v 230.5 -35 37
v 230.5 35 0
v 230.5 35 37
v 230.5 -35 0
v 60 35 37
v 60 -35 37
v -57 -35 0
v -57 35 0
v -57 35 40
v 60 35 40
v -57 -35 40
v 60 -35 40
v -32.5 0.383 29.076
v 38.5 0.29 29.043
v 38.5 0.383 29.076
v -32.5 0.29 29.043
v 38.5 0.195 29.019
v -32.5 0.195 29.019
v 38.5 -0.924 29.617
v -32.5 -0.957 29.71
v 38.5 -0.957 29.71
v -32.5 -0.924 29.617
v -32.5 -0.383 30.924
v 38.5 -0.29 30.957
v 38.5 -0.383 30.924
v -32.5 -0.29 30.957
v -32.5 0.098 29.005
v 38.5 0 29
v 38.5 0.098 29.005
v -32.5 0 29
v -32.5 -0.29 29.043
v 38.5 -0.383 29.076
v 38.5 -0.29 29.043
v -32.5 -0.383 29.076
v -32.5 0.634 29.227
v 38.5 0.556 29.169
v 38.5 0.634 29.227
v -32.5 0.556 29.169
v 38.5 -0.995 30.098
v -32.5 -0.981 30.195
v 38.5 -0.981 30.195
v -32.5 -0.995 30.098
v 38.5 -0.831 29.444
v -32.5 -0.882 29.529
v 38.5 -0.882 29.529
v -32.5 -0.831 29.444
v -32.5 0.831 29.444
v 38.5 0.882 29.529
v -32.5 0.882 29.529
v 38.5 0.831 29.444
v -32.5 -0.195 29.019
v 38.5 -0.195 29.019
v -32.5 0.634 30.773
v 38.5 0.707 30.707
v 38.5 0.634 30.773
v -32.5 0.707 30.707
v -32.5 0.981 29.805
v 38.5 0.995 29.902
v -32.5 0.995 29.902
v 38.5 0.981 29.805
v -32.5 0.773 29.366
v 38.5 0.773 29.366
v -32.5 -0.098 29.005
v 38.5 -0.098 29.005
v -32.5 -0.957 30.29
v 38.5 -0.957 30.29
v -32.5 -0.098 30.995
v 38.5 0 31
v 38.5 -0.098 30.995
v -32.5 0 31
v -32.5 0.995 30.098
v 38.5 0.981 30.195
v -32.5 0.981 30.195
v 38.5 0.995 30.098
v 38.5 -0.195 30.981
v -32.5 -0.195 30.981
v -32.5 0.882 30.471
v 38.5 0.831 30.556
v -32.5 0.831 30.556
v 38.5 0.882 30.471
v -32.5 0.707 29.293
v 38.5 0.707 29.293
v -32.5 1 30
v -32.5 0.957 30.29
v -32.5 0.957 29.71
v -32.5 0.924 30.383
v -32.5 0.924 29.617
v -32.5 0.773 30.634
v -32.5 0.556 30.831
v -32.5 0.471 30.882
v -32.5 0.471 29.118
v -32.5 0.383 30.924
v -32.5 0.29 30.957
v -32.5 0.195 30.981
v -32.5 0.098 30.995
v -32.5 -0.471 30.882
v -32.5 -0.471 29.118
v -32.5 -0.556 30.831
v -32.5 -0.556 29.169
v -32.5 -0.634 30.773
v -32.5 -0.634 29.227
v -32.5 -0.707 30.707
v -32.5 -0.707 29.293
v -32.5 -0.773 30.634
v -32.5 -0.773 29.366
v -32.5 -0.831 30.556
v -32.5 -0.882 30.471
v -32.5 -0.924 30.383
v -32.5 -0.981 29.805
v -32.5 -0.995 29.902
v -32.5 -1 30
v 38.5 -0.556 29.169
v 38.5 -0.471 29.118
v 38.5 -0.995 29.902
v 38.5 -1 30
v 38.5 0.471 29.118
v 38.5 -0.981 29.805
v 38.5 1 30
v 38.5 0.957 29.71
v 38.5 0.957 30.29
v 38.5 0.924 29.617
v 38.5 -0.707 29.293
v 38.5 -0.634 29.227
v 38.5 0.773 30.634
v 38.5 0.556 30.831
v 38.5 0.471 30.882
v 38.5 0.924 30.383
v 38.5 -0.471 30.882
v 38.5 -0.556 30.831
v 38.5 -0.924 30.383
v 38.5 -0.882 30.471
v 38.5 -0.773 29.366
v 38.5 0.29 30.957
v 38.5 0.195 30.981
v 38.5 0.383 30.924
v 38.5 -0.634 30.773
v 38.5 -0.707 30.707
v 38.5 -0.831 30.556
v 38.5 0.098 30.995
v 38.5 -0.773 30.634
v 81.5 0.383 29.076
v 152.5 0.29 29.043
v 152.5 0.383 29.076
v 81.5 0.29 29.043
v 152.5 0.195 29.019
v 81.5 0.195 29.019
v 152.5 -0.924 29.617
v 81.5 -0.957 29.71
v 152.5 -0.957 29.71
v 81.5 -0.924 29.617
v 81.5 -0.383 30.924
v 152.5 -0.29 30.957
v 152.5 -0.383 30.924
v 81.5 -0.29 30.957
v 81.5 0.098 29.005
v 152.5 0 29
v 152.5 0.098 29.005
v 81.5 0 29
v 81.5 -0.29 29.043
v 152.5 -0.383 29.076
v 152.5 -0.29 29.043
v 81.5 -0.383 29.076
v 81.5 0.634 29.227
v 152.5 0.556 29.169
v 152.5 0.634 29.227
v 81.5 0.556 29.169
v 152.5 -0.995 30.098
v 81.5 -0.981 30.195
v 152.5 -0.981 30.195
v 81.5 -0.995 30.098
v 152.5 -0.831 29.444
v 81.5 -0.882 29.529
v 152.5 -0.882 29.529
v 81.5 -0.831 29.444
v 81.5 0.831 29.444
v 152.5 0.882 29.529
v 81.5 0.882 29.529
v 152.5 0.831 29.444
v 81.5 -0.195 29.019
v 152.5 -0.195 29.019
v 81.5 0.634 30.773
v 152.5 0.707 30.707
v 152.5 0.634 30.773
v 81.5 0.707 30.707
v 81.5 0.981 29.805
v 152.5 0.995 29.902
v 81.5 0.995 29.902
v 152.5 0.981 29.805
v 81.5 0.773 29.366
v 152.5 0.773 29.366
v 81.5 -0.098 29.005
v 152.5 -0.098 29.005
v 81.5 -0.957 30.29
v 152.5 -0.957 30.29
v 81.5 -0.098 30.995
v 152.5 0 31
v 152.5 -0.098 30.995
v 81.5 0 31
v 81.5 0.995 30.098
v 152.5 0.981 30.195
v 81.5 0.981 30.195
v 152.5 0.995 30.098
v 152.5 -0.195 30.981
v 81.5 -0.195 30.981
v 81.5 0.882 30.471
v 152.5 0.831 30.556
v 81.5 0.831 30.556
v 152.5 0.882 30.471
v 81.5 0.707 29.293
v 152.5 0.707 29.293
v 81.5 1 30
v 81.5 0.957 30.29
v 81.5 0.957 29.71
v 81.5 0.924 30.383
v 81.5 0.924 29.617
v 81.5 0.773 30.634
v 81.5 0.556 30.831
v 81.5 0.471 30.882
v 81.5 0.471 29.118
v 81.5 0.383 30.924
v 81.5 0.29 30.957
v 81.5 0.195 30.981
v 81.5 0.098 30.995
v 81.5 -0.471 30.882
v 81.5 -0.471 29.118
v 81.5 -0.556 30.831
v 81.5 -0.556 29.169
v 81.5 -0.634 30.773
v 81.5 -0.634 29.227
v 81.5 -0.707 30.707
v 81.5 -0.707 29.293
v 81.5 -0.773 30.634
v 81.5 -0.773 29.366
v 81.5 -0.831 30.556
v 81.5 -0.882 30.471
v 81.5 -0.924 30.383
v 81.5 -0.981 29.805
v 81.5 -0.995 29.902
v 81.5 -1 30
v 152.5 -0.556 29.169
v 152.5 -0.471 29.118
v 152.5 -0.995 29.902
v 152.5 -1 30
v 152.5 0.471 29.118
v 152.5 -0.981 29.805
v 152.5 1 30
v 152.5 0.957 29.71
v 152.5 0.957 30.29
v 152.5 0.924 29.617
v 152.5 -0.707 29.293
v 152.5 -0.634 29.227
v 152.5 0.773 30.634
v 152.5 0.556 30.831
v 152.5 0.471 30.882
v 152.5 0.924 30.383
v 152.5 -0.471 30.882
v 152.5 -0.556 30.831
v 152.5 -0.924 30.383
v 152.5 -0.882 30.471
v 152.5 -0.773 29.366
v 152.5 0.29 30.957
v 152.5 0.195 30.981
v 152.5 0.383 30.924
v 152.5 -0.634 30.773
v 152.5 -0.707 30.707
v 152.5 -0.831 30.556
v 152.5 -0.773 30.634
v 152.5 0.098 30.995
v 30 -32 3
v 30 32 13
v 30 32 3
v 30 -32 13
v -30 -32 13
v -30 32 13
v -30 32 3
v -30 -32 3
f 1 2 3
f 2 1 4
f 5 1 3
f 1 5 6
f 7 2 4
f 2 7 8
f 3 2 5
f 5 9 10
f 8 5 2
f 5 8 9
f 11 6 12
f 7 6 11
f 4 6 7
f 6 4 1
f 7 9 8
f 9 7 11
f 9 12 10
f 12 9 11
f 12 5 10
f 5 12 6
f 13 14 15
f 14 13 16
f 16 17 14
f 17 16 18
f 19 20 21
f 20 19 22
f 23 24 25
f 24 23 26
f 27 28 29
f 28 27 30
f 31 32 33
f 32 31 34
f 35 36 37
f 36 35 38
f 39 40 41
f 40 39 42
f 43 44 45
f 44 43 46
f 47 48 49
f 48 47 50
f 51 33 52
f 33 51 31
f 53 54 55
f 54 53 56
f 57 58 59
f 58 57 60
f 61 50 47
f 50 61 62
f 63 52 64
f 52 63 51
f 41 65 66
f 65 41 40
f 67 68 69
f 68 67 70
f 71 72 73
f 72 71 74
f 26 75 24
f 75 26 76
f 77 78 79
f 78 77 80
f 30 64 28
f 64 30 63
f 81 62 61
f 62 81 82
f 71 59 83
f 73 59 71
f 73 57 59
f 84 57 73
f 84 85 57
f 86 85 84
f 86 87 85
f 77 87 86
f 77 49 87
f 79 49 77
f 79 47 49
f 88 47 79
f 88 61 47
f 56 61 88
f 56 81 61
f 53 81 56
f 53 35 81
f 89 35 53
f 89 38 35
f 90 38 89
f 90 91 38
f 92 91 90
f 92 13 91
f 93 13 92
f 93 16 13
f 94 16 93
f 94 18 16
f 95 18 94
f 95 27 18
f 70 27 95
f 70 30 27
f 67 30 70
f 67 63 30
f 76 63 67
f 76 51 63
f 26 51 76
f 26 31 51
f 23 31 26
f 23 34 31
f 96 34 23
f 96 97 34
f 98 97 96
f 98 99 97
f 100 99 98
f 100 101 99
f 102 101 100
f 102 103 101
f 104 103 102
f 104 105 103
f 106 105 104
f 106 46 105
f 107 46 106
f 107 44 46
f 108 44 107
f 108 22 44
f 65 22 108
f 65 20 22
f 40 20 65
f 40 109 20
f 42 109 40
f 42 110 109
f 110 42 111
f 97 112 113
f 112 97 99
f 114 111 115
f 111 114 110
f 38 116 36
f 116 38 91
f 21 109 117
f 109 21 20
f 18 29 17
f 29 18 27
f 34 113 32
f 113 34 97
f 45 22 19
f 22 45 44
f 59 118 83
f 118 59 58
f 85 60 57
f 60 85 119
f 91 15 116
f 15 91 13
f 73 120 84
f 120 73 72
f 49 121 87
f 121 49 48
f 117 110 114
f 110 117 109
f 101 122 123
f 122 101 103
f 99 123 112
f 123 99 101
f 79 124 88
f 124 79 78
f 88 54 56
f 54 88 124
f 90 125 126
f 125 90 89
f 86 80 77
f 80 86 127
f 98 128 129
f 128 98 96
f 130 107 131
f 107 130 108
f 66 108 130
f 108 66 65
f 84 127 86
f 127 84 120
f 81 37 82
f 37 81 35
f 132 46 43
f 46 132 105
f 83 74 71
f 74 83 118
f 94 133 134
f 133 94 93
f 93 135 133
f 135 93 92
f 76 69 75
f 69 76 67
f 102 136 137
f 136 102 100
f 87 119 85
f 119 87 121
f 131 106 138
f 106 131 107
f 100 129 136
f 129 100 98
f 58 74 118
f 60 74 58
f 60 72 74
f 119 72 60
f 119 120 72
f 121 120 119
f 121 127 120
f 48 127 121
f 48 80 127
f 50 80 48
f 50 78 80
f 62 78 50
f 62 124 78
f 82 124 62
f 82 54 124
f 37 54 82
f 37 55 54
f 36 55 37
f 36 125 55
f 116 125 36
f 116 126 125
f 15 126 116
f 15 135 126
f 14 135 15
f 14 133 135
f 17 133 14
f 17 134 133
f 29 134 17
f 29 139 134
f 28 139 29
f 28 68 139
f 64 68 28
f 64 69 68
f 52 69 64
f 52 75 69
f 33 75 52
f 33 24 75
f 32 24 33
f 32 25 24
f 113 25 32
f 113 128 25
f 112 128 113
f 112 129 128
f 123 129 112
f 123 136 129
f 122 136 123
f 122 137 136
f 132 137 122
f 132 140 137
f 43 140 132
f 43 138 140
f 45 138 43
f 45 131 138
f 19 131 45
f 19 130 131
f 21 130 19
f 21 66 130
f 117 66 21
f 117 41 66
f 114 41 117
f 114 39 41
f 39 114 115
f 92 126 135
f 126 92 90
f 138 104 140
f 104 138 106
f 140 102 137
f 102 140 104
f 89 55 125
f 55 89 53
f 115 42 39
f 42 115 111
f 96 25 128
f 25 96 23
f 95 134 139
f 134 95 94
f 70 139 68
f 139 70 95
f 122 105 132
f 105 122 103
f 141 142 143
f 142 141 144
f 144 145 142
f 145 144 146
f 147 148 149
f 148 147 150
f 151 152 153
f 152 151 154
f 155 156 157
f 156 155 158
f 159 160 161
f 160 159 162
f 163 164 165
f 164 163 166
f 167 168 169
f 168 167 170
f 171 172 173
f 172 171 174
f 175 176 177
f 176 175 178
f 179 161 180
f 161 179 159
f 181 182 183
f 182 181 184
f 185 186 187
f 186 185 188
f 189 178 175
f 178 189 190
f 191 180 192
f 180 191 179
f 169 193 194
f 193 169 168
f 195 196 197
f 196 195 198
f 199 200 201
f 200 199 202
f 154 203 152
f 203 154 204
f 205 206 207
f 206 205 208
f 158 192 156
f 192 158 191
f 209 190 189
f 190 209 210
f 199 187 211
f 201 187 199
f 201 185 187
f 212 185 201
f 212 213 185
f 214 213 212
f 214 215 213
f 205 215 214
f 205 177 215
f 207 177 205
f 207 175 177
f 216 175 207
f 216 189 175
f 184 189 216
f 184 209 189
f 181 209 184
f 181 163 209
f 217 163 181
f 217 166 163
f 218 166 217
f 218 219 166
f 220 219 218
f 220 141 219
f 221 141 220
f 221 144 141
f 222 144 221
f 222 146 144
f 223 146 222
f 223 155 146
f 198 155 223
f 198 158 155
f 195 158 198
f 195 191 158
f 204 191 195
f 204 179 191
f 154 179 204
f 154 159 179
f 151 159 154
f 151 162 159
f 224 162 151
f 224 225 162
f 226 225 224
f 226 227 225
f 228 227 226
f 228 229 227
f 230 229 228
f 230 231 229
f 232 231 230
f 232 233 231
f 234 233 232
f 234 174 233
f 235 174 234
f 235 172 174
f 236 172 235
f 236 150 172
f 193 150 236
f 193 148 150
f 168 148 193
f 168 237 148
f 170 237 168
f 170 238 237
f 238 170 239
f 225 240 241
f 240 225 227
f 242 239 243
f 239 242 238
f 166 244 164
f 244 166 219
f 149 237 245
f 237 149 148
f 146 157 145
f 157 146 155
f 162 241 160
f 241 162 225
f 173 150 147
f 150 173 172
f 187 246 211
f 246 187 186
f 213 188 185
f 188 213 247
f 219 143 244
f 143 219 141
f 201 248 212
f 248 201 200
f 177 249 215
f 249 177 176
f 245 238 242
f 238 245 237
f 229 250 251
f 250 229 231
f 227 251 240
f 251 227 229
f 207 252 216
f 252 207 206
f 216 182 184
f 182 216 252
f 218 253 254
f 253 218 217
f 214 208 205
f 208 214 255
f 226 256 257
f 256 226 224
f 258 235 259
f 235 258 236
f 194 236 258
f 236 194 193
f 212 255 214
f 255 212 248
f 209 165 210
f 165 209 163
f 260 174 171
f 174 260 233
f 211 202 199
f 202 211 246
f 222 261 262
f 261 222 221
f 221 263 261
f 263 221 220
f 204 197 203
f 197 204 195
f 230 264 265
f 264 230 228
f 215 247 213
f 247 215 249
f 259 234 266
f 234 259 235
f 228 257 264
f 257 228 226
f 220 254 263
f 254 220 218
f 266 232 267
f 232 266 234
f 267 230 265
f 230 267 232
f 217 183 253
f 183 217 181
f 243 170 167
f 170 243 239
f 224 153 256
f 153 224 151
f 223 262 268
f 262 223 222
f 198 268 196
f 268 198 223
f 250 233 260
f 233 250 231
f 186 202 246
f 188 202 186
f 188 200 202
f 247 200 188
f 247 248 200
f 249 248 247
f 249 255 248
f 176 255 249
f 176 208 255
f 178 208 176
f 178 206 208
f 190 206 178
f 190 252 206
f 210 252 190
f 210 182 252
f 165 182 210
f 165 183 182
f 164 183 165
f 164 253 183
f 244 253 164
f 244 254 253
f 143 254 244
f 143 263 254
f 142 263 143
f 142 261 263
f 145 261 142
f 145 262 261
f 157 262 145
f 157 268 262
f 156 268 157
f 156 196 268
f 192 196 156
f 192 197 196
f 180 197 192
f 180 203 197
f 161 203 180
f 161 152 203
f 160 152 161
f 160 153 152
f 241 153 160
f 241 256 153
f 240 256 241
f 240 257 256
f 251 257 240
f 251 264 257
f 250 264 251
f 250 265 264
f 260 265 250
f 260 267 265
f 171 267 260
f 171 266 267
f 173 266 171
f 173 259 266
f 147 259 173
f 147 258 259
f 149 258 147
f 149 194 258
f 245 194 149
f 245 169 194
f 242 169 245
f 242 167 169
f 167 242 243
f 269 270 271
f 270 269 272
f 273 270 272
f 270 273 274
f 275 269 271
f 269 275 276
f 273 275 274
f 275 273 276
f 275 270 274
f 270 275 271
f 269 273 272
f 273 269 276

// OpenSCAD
// Mini horizontal gel-electrophoresis buffer tank
// Print orientation: base on XY plane, open top facing +Z

$fn = 64;

// --- Tank dimensions ---
tank_x = 120;   // outer length (X)
tank_y = 70;    // outer width (Y)
tank_z = 40;    // outer height (Z)

// --- Walls ---
wall = 3;       // wall thickness
floor = 3;      // floor thickness

// --- Platform ---
plat_len   = 60;   // platform length in X
plat_top_z = 13;   // platform top height (floor + 10)
plat_w     = tank_y - 2*wall;  // platform width = inner width

// --- Holes ---
hole_d = 2;     // electrode hole diameter
hole_y = 0;     // hole Y position
hole_z = 30;    // hole Z position

// --- Cutting overlap ---
eps = 0.5;      // extension past cut faces

difference() {
    // Tank body
    union() {
        // Side walls and floor
        hull() {
            for (sx = [-1, 1])
                translate([sx * (tank_x/2 - wall), -tank_y/2, 0])
                    cube([wall, tank_y, tank_z]);
        }
        // End walls (at X ends), open top
        for (ez = [0, 1])
            translate([ez == 1 ? wall : tank_x - wall, -tank_y/2, 0])
                cube([tank_x - 2*wall + (ez == 0 ? -eps : eps),
                      tank_y,
                      tank_z - floor]);
    }

    // Central raised platform
    translate([-plat_len/2, -plat_w/2, floor])
        cube([plat_len, plat_w, plat_top_z - floor]);

    // Electrode holes through end walls
    for (x = [wall, tank_x - wall])
        translate([x, hole_y, hole_z])
            rotate([0, 90, 0])
                cylinder(d = hole_d, h = tank_y + 2*eps, center = true);
}
